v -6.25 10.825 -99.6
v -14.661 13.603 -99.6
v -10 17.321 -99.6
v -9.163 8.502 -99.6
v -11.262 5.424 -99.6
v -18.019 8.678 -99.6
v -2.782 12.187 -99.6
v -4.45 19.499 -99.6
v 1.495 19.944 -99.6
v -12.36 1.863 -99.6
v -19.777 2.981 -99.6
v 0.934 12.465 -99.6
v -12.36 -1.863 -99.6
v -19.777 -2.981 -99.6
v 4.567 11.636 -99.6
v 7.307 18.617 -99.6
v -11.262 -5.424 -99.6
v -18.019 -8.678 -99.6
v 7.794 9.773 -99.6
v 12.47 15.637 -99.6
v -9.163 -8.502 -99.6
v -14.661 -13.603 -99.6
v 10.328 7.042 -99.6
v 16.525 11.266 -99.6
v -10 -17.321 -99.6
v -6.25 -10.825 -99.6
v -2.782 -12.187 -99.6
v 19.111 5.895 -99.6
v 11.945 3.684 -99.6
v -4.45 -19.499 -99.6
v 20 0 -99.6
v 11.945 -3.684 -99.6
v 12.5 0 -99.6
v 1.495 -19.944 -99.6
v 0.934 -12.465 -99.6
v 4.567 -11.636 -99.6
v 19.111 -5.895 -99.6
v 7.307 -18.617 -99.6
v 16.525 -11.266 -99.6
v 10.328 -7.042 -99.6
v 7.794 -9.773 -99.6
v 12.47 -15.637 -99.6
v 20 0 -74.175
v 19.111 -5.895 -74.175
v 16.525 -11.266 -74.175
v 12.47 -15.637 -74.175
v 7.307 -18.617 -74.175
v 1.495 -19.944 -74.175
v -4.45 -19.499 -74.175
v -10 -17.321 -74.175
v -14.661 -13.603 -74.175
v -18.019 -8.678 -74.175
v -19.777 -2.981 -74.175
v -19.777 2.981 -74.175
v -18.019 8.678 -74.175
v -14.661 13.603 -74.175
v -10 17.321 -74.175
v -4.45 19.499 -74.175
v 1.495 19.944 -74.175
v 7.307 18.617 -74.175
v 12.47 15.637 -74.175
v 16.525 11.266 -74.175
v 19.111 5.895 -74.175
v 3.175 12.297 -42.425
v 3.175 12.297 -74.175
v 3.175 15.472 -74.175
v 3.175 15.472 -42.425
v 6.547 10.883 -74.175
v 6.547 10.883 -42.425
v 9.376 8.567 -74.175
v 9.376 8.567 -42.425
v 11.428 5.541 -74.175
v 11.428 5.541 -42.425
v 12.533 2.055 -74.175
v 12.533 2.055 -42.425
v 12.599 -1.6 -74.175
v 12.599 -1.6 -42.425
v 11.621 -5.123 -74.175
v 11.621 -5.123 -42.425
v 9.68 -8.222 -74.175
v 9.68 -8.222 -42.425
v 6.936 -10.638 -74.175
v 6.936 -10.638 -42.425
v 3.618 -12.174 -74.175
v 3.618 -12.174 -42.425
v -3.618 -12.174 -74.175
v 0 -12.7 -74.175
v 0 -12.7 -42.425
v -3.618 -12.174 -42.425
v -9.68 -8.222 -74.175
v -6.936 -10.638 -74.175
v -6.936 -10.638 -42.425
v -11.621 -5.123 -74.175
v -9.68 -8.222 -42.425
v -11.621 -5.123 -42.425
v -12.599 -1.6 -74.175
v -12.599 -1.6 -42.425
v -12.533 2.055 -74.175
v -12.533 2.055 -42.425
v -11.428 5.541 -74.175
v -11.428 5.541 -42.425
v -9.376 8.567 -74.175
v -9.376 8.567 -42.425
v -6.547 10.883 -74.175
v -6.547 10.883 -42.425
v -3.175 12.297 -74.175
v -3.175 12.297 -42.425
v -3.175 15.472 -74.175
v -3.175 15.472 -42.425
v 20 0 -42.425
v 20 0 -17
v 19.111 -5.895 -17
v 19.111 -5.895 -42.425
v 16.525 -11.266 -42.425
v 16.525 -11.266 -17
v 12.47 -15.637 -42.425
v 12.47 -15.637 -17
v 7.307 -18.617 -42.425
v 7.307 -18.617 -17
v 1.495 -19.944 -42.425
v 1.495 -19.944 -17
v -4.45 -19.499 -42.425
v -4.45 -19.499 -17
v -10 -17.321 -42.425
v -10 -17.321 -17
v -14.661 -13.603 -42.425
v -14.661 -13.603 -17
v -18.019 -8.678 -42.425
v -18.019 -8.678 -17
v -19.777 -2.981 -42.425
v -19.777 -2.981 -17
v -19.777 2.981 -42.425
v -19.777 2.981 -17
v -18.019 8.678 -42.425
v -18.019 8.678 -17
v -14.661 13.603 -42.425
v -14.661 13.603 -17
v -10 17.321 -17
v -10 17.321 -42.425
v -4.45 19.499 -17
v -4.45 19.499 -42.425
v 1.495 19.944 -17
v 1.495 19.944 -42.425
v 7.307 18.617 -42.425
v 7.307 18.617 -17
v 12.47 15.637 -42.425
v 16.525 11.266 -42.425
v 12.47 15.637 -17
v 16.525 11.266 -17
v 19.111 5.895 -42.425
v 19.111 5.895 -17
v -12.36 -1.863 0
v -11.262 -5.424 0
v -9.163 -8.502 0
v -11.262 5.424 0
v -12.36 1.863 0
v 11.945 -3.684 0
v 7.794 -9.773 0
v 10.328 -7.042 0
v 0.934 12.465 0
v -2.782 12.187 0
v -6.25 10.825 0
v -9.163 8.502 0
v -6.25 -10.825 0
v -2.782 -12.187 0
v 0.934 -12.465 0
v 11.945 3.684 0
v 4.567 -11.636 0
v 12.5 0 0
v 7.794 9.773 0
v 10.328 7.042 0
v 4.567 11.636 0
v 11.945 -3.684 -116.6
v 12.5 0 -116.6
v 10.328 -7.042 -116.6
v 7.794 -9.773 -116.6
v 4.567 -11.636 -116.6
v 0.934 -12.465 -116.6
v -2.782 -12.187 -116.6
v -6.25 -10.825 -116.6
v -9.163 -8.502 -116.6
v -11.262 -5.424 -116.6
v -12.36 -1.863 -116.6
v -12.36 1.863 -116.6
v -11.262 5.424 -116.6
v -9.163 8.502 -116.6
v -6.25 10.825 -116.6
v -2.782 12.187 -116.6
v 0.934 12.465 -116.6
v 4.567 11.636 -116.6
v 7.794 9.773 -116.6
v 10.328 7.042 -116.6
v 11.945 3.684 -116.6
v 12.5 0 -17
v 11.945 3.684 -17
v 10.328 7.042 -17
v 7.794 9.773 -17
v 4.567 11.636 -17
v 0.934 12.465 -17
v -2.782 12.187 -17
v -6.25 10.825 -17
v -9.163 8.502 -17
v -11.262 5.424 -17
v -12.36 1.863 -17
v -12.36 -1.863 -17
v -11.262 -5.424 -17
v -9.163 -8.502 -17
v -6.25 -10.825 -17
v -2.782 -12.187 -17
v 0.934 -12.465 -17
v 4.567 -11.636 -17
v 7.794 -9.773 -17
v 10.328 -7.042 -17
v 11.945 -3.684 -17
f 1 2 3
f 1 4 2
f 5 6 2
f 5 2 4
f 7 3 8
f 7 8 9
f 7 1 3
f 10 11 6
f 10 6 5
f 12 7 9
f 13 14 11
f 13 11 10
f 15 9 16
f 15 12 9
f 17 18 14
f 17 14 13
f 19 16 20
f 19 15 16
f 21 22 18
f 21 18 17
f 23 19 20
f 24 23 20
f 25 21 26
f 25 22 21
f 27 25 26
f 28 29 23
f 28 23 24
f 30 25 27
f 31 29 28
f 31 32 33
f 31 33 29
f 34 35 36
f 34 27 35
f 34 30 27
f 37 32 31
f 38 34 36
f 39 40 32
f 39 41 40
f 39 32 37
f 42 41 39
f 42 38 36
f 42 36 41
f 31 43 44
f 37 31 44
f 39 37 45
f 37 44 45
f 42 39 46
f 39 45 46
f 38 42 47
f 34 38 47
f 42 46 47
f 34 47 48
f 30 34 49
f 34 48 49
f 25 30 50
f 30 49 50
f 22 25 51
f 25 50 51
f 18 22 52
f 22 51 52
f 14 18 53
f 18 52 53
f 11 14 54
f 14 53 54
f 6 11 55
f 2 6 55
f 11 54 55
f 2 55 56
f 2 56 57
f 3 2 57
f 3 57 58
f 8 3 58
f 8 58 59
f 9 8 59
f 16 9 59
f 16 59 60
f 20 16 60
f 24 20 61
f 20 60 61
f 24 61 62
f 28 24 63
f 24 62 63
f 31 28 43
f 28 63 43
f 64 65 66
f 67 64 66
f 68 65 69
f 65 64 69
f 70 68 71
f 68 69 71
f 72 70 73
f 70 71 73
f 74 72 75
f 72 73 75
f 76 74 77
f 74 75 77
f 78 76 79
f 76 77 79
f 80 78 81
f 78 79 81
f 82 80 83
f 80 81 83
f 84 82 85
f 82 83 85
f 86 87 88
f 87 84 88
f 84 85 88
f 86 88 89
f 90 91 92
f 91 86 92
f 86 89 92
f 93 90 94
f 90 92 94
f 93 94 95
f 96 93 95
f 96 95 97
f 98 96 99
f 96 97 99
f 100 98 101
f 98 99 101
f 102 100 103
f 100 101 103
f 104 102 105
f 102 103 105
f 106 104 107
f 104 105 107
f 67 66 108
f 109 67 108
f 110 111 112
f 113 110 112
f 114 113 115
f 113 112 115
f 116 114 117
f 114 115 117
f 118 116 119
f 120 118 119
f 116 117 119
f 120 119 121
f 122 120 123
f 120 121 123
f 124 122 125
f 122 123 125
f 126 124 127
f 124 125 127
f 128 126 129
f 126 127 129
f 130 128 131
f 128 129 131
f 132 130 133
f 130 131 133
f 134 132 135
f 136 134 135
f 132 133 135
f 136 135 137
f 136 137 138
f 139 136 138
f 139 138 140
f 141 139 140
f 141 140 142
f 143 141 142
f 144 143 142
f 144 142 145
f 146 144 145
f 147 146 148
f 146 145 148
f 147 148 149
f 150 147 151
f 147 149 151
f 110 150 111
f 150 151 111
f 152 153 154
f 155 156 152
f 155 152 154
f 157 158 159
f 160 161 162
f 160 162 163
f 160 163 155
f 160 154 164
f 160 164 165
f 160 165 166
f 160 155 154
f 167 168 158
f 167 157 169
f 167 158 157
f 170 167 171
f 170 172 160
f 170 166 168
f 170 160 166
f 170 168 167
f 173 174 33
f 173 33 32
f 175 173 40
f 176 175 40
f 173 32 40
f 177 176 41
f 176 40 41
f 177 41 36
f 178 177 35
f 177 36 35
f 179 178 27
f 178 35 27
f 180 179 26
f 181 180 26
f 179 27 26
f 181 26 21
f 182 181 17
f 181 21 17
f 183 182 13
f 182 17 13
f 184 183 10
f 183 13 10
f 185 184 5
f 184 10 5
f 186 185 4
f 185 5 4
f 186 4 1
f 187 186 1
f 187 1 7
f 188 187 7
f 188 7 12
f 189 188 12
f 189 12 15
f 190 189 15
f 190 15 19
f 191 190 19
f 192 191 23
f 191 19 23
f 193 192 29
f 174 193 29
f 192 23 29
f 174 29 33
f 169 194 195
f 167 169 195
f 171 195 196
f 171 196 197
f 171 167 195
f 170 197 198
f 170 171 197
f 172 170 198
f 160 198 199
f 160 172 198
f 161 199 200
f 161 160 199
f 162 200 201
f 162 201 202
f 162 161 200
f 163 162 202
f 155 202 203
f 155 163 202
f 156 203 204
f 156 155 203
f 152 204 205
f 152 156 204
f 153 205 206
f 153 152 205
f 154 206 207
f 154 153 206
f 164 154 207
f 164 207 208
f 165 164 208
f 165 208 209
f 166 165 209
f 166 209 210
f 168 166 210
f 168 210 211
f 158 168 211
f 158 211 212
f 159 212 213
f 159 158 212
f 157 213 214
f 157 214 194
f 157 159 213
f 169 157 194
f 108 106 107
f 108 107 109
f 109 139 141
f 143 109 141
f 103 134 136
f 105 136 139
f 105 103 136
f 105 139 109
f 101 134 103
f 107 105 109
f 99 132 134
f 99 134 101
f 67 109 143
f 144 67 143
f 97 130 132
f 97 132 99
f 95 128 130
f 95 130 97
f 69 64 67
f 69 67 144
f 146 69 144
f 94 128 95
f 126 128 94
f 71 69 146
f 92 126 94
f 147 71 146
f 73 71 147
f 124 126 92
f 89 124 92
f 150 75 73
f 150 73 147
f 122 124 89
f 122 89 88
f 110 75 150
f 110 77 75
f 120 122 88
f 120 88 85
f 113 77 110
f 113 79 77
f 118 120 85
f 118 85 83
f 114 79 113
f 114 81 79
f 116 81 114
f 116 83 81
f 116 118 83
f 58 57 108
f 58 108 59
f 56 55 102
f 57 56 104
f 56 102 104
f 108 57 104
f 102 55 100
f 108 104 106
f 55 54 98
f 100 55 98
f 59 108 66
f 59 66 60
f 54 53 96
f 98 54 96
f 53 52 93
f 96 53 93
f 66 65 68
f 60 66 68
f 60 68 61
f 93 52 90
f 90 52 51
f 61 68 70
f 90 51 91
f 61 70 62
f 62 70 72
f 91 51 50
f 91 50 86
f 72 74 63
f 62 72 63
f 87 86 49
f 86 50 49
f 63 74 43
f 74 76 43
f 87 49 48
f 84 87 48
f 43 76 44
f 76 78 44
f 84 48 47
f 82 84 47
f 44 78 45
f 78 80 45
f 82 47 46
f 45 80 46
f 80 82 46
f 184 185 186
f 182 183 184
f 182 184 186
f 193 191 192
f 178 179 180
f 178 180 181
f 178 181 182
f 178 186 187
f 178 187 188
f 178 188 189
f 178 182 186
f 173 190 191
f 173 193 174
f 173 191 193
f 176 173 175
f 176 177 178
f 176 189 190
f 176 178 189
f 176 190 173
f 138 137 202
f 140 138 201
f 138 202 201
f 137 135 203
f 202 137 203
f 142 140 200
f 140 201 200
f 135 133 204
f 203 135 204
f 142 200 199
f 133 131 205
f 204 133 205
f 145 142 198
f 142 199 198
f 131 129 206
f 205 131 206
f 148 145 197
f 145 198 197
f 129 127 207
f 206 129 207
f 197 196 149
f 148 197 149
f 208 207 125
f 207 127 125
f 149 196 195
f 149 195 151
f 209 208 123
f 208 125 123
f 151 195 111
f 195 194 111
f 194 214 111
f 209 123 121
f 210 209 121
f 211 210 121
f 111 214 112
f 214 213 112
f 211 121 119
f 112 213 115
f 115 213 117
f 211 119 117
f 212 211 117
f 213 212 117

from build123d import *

# Parameters (mm, degrees)
SKETCH1_R           = 12.5
BOSS_EXTRUDE1_DEPTH = 17
SKETCH2_R           = 20
BOSS_EXTRUDE2_DEPTH = 25.425
SKETCH3_R           = 12.7
BOSS_EXTRUDE3_DEPTH = 31.75
SKETCH6_W           = 6.35
SKETCH6_H           = 3.175
BOSS_EXTRUDE6_DEPTH = 31.75
SKETCH4_R           = 20
BOSS_EXTRUDE4_DEPTH = 25.425
SKETCH5_R           = 12.5
BOSS_EXTRUDE5_DEPTH = 17


with BuildPart() as part:
    # Sketch1 → Boss-Extrude1 (new body)
    with BuildSketch(Plane.XY):
        Circle(SKETCH1_R)
    extrude(amount=-BOSS_EXTRUDE1_DEPTH)

    # Sketch2 → Boss-Extrude2 (add)
    with BuildSketch(Plane(origin=(0, 0, -17), x_dir=(-1, 0, 0), z_dir=(0, 0, -1))):
        with Locations(Location((0, 0, 0), (0, 0, 180))):
            Circle(SKETCH2_R)
    extrude(amount=BOSS_EXTRUDE2_DEPTH)

    # Sketch3 → Boss-Extrude3 (add)
    with BuildSketch(Plane(origin=(0, 0, -42.425), x_dir=(-1, 0, 0), z_dir=(0, 0, -1))):
        Circle(SKETCH3_R)
    extrude(amount=BOSS_EXTRUDE3_DEPTH)

    # Sketch6 → Boss-Extrude6 (add)
    with BuildSketch(Plane(origin=(0, 0, -74.175), x_dir=(-1, 0, 0), z_dir=(0, 0, -1))):
        with Locations((0, 13.884222124)):
            Rectangle(SKETCH6_W, SKETCH6_H)
    extrude(amount=-BOSS_EXTRUDE6_DEPTH)

    # Sketch4 → Boss-Extrude4 (add)
    with BuildSketch(Plane(origin=(0, 0, -74.175), x_dir=(-1, 0, 0), z_dir=(0, 0, -1))):
        with Locations(Location((0, 0, 0), (0, 0, 180))):
            Circle(SKETCH4_R)
    extrude(amount=BOSS_EXTRUDE4_DEPTH)

    # Sketch5 → Boss-Extrude5 (add)
    with BuildSketch(Plane(origin=(0, 0, -99.6), x_dir=(-1, 0, 0), z_dir=(0, 0, -1))):
        with Locations(Location((0, 0, 0), (0, 0, 180))):
            Circle(SKETCH5_R)
    extrude(amount=BOSS_EXTRUDE5_DEPTH)


solid = part.part
